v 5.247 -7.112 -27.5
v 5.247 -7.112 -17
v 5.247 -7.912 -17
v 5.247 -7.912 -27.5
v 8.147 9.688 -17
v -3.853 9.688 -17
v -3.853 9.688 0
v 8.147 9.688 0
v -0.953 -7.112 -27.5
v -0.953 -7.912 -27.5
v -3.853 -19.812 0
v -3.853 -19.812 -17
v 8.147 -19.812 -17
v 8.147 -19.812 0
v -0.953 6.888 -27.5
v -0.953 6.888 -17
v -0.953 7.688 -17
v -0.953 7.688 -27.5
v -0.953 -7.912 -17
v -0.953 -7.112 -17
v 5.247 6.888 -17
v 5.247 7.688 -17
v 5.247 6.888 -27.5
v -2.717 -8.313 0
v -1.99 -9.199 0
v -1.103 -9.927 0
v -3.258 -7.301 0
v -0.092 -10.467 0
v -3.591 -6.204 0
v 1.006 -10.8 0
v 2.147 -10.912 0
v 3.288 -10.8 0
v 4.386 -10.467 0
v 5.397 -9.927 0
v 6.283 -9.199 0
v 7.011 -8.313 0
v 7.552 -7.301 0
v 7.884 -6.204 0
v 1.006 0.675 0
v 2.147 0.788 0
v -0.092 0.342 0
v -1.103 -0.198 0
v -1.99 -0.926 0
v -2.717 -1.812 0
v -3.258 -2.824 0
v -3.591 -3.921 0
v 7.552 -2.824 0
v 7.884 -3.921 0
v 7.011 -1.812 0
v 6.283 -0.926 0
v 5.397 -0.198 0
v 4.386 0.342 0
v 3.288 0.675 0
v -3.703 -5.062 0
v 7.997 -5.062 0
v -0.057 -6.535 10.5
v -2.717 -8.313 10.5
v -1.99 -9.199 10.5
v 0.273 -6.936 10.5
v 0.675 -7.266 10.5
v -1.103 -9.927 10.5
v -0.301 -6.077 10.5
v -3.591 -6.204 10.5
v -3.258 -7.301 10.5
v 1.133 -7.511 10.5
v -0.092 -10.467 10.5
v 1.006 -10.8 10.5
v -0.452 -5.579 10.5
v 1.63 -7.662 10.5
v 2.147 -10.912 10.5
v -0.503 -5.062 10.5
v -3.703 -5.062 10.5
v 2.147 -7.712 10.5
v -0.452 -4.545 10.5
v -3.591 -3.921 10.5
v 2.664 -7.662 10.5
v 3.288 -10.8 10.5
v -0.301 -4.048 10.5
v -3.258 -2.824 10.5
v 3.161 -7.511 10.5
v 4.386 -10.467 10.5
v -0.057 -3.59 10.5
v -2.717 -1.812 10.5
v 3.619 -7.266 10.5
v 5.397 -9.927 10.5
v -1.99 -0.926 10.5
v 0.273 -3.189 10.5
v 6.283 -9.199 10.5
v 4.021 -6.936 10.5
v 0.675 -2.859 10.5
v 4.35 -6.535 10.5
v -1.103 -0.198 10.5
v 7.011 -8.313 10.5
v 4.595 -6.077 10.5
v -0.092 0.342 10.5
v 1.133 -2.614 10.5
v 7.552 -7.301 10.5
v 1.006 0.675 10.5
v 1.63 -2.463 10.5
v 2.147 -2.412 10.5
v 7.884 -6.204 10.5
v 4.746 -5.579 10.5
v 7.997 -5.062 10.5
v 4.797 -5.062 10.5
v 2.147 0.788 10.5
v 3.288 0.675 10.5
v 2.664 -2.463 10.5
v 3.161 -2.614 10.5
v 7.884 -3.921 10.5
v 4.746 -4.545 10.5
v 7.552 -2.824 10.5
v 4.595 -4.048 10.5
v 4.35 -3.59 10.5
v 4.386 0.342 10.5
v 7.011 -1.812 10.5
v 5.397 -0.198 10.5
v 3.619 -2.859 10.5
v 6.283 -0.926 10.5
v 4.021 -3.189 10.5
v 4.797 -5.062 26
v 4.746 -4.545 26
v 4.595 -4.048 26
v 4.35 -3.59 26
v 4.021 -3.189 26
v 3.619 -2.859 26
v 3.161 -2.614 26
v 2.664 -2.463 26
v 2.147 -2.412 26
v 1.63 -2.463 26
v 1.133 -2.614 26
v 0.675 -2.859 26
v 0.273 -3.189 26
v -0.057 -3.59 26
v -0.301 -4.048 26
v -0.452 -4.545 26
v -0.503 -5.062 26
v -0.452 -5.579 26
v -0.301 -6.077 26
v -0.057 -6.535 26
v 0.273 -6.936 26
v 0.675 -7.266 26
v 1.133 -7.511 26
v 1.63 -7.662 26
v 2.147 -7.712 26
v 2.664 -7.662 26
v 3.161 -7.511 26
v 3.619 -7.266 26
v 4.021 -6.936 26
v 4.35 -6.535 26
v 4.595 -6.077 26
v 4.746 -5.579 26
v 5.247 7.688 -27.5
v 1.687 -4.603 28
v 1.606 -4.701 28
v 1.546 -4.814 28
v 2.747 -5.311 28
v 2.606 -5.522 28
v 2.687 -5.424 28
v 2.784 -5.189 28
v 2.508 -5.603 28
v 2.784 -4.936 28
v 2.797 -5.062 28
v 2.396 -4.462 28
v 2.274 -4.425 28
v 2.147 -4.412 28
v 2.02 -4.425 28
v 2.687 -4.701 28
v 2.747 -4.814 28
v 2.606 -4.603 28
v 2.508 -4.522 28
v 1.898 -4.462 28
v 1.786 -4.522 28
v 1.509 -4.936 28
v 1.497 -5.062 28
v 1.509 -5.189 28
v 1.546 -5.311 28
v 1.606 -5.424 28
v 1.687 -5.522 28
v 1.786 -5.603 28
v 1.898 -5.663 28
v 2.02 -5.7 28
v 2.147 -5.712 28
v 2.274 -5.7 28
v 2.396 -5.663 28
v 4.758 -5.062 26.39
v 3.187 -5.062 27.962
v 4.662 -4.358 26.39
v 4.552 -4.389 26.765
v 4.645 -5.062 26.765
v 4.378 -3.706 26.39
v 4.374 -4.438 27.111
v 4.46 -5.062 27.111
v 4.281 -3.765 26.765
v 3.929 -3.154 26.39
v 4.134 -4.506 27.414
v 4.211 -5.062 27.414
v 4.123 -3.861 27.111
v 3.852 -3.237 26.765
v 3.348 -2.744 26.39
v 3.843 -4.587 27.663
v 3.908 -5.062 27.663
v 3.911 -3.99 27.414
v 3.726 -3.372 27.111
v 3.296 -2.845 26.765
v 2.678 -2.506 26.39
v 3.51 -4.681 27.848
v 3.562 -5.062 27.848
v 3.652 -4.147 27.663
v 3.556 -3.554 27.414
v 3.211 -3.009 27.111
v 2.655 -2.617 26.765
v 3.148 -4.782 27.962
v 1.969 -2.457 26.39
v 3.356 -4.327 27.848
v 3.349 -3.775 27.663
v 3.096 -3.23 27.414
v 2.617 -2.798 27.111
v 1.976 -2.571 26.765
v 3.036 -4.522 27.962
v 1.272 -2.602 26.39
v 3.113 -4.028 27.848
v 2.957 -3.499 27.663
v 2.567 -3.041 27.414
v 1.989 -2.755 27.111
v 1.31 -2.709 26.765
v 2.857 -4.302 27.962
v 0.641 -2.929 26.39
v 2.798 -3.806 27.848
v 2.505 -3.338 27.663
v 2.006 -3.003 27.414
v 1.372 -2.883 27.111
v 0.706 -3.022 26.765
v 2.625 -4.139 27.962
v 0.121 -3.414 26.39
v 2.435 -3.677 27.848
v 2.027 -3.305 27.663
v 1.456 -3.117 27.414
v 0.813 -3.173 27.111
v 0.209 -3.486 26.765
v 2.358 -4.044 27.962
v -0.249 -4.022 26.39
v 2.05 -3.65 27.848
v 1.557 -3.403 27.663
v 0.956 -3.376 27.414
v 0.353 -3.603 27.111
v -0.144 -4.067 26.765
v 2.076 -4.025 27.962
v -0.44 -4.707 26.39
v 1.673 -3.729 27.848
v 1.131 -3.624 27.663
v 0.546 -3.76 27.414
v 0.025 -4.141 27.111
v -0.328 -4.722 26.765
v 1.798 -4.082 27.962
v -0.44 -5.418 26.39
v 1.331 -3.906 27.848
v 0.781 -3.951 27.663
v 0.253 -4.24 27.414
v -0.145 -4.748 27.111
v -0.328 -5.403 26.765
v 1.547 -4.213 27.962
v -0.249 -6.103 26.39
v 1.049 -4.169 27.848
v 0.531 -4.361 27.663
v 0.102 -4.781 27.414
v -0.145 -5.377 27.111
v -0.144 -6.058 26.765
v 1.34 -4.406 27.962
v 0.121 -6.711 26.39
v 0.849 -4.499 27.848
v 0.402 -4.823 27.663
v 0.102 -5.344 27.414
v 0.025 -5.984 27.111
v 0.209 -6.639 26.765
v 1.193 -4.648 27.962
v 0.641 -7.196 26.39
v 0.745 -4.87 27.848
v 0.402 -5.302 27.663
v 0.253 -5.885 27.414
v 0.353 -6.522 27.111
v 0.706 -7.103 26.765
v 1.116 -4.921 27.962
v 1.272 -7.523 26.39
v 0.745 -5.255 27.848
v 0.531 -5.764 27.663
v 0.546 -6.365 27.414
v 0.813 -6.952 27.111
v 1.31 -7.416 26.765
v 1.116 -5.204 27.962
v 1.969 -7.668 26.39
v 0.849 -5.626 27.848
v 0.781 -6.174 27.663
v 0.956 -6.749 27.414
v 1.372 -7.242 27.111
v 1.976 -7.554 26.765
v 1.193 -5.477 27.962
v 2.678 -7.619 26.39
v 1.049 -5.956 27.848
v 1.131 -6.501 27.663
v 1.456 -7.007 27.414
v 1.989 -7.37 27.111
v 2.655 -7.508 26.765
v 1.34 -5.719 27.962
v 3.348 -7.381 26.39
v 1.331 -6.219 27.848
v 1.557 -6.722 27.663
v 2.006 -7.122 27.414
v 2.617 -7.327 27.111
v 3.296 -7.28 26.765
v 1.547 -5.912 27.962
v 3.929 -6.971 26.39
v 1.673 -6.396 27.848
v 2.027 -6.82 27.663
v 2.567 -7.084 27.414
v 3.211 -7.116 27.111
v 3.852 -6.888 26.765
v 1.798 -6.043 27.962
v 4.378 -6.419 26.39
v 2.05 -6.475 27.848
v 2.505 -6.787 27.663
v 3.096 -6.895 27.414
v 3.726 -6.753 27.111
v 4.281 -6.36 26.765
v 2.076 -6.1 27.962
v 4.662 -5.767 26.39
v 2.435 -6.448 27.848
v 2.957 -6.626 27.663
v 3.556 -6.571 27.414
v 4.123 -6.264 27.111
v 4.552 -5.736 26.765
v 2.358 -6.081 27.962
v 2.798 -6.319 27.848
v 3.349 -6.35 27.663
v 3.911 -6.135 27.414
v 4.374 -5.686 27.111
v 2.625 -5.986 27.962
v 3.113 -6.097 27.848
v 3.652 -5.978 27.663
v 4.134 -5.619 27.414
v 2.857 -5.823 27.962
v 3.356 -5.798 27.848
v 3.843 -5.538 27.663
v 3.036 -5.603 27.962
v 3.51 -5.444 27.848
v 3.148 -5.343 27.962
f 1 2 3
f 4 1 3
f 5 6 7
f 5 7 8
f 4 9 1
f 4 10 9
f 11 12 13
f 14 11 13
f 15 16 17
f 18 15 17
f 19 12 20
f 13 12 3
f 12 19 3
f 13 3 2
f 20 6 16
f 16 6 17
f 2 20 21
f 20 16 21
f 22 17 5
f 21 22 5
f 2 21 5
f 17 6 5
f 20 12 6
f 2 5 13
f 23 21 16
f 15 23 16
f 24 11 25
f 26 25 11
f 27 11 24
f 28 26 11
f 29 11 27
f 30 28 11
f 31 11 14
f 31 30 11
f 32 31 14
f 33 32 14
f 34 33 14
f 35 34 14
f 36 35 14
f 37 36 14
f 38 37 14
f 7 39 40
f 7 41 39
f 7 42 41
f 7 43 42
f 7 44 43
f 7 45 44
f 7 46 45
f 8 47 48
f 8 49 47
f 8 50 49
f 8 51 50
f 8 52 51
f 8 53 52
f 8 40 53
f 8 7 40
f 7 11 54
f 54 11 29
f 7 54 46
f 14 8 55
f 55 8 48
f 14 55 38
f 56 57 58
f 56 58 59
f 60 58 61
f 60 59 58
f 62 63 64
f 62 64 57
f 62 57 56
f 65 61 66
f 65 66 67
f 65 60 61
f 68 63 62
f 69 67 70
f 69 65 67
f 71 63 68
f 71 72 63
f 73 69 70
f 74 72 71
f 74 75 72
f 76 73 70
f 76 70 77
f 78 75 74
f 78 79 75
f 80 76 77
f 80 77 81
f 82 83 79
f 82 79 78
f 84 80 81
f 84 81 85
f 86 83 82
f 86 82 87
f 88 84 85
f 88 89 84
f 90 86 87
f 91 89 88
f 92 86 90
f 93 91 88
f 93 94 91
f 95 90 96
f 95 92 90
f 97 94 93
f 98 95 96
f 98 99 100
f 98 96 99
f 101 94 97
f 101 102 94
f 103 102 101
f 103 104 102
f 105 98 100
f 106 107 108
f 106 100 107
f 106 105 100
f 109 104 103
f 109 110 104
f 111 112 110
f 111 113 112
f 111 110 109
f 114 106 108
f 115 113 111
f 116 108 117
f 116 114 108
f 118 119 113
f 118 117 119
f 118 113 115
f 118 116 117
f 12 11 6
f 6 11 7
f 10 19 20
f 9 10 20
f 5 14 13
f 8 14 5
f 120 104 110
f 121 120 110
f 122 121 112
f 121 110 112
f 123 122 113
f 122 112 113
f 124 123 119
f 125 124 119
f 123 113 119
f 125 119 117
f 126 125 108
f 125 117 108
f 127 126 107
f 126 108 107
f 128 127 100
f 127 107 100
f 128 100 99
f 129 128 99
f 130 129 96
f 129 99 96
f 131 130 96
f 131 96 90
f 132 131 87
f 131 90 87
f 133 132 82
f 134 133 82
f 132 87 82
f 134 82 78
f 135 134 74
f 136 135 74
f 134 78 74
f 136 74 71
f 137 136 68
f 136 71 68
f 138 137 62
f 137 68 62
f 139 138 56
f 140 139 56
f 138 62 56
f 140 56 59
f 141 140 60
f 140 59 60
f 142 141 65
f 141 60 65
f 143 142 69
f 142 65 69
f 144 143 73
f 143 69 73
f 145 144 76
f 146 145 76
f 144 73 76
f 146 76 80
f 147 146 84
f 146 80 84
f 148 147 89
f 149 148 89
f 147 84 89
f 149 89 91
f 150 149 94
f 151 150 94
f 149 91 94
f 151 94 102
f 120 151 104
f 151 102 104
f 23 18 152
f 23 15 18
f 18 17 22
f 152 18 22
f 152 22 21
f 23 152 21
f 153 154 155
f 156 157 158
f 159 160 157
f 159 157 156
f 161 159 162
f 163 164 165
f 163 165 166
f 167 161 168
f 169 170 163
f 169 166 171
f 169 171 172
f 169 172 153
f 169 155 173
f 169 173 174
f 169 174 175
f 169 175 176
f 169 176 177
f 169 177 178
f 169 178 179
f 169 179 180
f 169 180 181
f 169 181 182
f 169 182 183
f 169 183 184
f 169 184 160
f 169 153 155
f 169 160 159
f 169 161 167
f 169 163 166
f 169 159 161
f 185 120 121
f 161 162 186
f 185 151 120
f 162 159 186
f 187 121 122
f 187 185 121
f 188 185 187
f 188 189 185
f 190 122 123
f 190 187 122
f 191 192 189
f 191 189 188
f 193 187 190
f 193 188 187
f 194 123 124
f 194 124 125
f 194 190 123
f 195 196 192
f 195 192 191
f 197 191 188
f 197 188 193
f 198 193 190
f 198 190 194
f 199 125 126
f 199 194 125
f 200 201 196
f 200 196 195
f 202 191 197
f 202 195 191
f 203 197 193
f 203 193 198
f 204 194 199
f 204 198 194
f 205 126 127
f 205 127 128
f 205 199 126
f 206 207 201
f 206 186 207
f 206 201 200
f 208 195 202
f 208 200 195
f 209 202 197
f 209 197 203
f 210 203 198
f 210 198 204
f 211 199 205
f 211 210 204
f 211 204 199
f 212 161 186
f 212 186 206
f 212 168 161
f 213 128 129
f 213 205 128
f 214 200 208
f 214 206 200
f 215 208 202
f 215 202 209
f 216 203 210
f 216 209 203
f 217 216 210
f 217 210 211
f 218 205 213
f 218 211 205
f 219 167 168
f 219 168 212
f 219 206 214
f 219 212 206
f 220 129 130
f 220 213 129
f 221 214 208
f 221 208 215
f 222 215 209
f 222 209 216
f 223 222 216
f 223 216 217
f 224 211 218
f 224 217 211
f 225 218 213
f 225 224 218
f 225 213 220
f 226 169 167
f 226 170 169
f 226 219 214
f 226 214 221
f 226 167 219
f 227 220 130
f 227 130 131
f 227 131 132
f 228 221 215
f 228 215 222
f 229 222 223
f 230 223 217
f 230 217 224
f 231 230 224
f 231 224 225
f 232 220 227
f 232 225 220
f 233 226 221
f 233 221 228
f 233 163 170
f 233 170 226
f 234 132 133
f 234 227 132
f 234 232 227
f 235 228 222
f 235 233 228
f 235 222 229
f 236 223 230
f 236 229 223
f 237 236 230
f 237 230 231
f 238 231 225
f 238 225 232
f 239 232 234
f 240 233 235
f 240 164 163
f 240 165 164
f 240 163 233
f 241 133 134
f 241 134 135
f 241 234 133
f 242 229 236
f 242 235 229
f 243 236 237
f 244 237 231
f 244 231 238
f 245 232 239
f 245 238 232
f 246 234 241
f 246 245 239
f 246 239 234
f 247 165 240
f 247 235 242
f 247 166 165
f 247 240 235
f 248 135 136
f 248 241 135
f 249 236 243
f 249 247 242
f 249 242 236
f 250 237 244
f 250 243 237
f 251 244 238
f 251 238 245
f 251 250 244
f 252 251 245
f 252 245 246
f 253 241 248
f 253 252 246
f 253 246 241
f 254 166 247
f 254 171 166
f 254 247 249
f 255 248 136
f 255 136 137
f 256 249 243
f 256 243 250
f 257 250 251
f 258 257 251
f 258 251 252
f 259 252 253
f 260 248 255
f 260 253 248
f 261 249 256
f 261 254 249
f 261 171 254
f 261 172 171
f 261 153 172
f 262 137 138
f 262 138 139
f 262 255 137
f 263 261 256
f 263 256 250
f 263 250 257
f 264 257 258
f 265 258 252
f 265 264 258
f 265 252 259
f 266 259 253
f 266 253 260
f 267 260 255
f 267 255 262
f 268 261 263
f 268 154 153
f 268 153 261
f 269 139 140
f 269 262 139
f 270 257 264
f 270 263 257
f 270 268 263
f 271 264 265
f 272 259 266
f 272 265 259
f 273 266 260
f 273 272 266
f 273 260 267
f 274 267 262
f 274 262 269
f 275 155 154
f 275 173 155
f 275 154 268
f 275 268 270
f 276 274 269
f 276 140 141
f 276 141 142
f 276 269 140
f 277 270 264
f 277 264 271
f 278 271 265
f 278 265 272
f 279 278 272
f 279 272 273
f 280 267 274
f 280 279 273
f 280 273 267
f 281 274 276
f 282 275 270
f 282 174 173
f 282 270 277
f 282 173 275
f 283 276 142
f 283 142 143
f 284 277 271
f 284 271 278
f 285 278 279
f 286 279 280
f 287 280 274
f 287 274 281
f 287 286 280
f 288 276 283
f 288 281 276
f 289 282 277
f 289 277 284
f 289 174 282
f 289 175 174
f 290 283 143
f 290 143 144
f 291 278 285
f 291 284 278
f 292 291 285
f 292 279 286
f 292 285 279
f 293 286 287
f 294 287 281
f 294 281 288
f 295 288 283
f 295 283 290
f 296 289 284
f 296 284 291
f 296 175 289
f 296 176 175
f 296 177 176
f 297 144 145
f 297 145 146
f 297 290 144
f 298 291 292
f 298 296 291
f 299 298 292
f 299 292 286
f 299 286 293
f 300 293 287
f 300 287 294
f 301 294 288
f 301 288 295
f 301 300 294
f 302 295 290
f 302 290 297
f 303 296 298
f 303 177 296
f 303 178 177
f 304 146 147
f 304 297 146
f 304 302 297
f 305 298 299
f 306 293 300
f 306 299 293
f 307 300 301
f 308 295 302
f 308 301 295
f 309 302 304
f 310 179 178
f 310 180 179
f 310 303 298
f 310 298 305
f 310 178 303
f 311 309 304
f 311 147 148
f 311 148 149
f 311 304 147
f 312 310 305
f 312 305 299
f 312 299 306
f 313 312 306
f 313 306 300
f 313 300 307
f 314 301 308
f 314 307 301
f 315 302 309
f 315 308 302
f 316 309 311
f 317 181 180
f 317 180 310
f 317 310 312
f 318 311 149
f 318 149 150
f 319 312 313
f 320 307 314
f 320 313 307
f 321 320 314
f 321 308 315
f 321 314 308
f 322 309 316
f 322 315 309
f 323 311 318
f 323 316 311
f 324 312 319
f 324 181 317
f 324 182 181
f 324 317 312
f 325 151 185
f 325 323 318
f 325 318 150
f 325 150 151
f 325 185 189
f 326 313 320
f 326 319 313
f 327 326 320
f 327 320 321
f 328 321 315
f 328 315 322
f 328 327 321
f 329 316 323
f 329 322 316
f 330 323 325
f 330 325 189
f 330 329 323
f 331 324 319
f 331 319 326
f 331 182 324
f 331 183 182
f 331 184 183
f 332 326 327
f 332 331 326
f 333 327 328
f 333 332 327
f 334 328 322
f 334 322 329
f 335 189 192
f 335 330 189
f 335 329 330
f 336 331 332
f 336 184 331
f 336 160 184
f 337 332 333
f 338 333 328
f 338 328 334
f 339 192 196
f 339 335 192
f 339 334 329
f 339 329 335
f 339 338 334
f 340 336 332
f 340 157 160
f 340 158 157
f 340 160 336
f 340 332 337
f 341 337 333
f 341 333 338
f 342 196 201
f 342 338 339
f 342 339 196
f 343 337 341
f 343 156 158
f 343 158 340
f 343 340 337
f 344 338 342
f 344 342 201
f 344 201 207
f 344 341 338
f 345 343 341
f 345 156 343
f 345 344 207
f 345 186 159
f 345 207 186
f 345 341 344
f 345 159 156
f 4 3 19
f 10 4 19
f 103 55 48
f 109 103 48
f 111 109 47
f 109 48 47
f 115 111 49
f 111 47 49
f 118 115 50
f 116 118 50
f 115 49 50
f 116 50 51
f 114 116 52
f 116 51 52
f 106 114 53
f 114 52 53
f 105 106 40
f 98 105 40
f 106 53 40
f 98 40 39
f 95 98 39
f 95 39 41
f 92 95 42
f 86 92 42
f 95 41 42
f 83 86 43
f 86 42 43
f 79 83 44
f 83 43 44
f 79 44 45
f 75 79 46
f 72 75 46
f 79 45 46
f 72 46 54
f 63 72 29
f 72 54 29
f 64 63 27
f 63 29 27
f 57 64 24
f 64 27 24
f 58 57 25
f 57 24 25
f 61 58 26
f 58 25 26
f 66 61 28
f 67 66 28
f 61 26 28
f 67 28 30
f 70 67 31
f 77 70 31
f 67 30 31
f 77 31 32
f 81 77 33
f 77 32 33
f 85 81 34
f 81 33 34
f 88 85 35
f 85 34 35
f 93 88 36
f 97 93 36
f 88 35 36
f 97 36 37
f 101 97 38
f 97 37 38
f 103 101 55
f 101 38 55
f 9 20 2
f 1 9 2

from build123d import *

# Parameters (mm, degrees)
F0_W     = 12
F0_H     = 29.5
F0_R     = 5.85
F1_DEPTH = 17
F2_DEPTH = 10.5
F3_R     = 2.65
F4_DEPTH = 17.5
F5_R     = 2
F7_DEPTH = 10.5


with BuildPart() as f1:
    # F0 (on Top) → F1 (new body)
    with BuildSketch(Plane.XY):
        with Locations((2.146811, -5.062469)):
            Rectangle(F0_W, F0_H)
        with Locations((2.146811, -5.062469)):
            Circle(F0_R, mode=Mode.SUBTRACT)
        with Locations((2.146811, -5.062469)):
            Circle(F0_R)
    extrude(amount=-F1_DEPTH)

    # F0 (on Top) → F2 (join)
    with BuildSketch(Plane.XY):
        with Locations((2.146811, -5.062469)):
            Circle(F0_R)
    extrude(amount=F2_DEPTH)

    # F3 (on face) → F4 (join)
    with BuildSketch(Plane.XY.offset(10.5)):
        with Locations((2.146811, -5.062469)):
            Circle(F3_R)
    extrude(amount=F4_DEPTH)

    # F5
    f5_edges = [f1.edges().sort_by_distance(p)[0] for p in [
        (-0.503189, -5.062469, 28),
    ]]
    fillet(f5_edges, radius=F5_R)

    # F6 (on face) → F7 (join)
    with BuildSketch(Plane(origin=(0, 0, -17), x_dir=(1, 0, 0), z_dir=(0, 0, -1))):
        Polygon((-0.953189, 7.112469), (2.146811, 7.112469), (5.246811, 7.112469), (5.246811, 7.912469), (-0.953189, 7.912469), align=None)
        Polygon((-0.953189, -7.687531), (2.146811, -7.687531), (5.246811, -7.687531), (5.246811, -6.887531), (-0.953189, -6.887531), align=None)
    extrude(amount=F7_DEPTH)


solid = f1.part
